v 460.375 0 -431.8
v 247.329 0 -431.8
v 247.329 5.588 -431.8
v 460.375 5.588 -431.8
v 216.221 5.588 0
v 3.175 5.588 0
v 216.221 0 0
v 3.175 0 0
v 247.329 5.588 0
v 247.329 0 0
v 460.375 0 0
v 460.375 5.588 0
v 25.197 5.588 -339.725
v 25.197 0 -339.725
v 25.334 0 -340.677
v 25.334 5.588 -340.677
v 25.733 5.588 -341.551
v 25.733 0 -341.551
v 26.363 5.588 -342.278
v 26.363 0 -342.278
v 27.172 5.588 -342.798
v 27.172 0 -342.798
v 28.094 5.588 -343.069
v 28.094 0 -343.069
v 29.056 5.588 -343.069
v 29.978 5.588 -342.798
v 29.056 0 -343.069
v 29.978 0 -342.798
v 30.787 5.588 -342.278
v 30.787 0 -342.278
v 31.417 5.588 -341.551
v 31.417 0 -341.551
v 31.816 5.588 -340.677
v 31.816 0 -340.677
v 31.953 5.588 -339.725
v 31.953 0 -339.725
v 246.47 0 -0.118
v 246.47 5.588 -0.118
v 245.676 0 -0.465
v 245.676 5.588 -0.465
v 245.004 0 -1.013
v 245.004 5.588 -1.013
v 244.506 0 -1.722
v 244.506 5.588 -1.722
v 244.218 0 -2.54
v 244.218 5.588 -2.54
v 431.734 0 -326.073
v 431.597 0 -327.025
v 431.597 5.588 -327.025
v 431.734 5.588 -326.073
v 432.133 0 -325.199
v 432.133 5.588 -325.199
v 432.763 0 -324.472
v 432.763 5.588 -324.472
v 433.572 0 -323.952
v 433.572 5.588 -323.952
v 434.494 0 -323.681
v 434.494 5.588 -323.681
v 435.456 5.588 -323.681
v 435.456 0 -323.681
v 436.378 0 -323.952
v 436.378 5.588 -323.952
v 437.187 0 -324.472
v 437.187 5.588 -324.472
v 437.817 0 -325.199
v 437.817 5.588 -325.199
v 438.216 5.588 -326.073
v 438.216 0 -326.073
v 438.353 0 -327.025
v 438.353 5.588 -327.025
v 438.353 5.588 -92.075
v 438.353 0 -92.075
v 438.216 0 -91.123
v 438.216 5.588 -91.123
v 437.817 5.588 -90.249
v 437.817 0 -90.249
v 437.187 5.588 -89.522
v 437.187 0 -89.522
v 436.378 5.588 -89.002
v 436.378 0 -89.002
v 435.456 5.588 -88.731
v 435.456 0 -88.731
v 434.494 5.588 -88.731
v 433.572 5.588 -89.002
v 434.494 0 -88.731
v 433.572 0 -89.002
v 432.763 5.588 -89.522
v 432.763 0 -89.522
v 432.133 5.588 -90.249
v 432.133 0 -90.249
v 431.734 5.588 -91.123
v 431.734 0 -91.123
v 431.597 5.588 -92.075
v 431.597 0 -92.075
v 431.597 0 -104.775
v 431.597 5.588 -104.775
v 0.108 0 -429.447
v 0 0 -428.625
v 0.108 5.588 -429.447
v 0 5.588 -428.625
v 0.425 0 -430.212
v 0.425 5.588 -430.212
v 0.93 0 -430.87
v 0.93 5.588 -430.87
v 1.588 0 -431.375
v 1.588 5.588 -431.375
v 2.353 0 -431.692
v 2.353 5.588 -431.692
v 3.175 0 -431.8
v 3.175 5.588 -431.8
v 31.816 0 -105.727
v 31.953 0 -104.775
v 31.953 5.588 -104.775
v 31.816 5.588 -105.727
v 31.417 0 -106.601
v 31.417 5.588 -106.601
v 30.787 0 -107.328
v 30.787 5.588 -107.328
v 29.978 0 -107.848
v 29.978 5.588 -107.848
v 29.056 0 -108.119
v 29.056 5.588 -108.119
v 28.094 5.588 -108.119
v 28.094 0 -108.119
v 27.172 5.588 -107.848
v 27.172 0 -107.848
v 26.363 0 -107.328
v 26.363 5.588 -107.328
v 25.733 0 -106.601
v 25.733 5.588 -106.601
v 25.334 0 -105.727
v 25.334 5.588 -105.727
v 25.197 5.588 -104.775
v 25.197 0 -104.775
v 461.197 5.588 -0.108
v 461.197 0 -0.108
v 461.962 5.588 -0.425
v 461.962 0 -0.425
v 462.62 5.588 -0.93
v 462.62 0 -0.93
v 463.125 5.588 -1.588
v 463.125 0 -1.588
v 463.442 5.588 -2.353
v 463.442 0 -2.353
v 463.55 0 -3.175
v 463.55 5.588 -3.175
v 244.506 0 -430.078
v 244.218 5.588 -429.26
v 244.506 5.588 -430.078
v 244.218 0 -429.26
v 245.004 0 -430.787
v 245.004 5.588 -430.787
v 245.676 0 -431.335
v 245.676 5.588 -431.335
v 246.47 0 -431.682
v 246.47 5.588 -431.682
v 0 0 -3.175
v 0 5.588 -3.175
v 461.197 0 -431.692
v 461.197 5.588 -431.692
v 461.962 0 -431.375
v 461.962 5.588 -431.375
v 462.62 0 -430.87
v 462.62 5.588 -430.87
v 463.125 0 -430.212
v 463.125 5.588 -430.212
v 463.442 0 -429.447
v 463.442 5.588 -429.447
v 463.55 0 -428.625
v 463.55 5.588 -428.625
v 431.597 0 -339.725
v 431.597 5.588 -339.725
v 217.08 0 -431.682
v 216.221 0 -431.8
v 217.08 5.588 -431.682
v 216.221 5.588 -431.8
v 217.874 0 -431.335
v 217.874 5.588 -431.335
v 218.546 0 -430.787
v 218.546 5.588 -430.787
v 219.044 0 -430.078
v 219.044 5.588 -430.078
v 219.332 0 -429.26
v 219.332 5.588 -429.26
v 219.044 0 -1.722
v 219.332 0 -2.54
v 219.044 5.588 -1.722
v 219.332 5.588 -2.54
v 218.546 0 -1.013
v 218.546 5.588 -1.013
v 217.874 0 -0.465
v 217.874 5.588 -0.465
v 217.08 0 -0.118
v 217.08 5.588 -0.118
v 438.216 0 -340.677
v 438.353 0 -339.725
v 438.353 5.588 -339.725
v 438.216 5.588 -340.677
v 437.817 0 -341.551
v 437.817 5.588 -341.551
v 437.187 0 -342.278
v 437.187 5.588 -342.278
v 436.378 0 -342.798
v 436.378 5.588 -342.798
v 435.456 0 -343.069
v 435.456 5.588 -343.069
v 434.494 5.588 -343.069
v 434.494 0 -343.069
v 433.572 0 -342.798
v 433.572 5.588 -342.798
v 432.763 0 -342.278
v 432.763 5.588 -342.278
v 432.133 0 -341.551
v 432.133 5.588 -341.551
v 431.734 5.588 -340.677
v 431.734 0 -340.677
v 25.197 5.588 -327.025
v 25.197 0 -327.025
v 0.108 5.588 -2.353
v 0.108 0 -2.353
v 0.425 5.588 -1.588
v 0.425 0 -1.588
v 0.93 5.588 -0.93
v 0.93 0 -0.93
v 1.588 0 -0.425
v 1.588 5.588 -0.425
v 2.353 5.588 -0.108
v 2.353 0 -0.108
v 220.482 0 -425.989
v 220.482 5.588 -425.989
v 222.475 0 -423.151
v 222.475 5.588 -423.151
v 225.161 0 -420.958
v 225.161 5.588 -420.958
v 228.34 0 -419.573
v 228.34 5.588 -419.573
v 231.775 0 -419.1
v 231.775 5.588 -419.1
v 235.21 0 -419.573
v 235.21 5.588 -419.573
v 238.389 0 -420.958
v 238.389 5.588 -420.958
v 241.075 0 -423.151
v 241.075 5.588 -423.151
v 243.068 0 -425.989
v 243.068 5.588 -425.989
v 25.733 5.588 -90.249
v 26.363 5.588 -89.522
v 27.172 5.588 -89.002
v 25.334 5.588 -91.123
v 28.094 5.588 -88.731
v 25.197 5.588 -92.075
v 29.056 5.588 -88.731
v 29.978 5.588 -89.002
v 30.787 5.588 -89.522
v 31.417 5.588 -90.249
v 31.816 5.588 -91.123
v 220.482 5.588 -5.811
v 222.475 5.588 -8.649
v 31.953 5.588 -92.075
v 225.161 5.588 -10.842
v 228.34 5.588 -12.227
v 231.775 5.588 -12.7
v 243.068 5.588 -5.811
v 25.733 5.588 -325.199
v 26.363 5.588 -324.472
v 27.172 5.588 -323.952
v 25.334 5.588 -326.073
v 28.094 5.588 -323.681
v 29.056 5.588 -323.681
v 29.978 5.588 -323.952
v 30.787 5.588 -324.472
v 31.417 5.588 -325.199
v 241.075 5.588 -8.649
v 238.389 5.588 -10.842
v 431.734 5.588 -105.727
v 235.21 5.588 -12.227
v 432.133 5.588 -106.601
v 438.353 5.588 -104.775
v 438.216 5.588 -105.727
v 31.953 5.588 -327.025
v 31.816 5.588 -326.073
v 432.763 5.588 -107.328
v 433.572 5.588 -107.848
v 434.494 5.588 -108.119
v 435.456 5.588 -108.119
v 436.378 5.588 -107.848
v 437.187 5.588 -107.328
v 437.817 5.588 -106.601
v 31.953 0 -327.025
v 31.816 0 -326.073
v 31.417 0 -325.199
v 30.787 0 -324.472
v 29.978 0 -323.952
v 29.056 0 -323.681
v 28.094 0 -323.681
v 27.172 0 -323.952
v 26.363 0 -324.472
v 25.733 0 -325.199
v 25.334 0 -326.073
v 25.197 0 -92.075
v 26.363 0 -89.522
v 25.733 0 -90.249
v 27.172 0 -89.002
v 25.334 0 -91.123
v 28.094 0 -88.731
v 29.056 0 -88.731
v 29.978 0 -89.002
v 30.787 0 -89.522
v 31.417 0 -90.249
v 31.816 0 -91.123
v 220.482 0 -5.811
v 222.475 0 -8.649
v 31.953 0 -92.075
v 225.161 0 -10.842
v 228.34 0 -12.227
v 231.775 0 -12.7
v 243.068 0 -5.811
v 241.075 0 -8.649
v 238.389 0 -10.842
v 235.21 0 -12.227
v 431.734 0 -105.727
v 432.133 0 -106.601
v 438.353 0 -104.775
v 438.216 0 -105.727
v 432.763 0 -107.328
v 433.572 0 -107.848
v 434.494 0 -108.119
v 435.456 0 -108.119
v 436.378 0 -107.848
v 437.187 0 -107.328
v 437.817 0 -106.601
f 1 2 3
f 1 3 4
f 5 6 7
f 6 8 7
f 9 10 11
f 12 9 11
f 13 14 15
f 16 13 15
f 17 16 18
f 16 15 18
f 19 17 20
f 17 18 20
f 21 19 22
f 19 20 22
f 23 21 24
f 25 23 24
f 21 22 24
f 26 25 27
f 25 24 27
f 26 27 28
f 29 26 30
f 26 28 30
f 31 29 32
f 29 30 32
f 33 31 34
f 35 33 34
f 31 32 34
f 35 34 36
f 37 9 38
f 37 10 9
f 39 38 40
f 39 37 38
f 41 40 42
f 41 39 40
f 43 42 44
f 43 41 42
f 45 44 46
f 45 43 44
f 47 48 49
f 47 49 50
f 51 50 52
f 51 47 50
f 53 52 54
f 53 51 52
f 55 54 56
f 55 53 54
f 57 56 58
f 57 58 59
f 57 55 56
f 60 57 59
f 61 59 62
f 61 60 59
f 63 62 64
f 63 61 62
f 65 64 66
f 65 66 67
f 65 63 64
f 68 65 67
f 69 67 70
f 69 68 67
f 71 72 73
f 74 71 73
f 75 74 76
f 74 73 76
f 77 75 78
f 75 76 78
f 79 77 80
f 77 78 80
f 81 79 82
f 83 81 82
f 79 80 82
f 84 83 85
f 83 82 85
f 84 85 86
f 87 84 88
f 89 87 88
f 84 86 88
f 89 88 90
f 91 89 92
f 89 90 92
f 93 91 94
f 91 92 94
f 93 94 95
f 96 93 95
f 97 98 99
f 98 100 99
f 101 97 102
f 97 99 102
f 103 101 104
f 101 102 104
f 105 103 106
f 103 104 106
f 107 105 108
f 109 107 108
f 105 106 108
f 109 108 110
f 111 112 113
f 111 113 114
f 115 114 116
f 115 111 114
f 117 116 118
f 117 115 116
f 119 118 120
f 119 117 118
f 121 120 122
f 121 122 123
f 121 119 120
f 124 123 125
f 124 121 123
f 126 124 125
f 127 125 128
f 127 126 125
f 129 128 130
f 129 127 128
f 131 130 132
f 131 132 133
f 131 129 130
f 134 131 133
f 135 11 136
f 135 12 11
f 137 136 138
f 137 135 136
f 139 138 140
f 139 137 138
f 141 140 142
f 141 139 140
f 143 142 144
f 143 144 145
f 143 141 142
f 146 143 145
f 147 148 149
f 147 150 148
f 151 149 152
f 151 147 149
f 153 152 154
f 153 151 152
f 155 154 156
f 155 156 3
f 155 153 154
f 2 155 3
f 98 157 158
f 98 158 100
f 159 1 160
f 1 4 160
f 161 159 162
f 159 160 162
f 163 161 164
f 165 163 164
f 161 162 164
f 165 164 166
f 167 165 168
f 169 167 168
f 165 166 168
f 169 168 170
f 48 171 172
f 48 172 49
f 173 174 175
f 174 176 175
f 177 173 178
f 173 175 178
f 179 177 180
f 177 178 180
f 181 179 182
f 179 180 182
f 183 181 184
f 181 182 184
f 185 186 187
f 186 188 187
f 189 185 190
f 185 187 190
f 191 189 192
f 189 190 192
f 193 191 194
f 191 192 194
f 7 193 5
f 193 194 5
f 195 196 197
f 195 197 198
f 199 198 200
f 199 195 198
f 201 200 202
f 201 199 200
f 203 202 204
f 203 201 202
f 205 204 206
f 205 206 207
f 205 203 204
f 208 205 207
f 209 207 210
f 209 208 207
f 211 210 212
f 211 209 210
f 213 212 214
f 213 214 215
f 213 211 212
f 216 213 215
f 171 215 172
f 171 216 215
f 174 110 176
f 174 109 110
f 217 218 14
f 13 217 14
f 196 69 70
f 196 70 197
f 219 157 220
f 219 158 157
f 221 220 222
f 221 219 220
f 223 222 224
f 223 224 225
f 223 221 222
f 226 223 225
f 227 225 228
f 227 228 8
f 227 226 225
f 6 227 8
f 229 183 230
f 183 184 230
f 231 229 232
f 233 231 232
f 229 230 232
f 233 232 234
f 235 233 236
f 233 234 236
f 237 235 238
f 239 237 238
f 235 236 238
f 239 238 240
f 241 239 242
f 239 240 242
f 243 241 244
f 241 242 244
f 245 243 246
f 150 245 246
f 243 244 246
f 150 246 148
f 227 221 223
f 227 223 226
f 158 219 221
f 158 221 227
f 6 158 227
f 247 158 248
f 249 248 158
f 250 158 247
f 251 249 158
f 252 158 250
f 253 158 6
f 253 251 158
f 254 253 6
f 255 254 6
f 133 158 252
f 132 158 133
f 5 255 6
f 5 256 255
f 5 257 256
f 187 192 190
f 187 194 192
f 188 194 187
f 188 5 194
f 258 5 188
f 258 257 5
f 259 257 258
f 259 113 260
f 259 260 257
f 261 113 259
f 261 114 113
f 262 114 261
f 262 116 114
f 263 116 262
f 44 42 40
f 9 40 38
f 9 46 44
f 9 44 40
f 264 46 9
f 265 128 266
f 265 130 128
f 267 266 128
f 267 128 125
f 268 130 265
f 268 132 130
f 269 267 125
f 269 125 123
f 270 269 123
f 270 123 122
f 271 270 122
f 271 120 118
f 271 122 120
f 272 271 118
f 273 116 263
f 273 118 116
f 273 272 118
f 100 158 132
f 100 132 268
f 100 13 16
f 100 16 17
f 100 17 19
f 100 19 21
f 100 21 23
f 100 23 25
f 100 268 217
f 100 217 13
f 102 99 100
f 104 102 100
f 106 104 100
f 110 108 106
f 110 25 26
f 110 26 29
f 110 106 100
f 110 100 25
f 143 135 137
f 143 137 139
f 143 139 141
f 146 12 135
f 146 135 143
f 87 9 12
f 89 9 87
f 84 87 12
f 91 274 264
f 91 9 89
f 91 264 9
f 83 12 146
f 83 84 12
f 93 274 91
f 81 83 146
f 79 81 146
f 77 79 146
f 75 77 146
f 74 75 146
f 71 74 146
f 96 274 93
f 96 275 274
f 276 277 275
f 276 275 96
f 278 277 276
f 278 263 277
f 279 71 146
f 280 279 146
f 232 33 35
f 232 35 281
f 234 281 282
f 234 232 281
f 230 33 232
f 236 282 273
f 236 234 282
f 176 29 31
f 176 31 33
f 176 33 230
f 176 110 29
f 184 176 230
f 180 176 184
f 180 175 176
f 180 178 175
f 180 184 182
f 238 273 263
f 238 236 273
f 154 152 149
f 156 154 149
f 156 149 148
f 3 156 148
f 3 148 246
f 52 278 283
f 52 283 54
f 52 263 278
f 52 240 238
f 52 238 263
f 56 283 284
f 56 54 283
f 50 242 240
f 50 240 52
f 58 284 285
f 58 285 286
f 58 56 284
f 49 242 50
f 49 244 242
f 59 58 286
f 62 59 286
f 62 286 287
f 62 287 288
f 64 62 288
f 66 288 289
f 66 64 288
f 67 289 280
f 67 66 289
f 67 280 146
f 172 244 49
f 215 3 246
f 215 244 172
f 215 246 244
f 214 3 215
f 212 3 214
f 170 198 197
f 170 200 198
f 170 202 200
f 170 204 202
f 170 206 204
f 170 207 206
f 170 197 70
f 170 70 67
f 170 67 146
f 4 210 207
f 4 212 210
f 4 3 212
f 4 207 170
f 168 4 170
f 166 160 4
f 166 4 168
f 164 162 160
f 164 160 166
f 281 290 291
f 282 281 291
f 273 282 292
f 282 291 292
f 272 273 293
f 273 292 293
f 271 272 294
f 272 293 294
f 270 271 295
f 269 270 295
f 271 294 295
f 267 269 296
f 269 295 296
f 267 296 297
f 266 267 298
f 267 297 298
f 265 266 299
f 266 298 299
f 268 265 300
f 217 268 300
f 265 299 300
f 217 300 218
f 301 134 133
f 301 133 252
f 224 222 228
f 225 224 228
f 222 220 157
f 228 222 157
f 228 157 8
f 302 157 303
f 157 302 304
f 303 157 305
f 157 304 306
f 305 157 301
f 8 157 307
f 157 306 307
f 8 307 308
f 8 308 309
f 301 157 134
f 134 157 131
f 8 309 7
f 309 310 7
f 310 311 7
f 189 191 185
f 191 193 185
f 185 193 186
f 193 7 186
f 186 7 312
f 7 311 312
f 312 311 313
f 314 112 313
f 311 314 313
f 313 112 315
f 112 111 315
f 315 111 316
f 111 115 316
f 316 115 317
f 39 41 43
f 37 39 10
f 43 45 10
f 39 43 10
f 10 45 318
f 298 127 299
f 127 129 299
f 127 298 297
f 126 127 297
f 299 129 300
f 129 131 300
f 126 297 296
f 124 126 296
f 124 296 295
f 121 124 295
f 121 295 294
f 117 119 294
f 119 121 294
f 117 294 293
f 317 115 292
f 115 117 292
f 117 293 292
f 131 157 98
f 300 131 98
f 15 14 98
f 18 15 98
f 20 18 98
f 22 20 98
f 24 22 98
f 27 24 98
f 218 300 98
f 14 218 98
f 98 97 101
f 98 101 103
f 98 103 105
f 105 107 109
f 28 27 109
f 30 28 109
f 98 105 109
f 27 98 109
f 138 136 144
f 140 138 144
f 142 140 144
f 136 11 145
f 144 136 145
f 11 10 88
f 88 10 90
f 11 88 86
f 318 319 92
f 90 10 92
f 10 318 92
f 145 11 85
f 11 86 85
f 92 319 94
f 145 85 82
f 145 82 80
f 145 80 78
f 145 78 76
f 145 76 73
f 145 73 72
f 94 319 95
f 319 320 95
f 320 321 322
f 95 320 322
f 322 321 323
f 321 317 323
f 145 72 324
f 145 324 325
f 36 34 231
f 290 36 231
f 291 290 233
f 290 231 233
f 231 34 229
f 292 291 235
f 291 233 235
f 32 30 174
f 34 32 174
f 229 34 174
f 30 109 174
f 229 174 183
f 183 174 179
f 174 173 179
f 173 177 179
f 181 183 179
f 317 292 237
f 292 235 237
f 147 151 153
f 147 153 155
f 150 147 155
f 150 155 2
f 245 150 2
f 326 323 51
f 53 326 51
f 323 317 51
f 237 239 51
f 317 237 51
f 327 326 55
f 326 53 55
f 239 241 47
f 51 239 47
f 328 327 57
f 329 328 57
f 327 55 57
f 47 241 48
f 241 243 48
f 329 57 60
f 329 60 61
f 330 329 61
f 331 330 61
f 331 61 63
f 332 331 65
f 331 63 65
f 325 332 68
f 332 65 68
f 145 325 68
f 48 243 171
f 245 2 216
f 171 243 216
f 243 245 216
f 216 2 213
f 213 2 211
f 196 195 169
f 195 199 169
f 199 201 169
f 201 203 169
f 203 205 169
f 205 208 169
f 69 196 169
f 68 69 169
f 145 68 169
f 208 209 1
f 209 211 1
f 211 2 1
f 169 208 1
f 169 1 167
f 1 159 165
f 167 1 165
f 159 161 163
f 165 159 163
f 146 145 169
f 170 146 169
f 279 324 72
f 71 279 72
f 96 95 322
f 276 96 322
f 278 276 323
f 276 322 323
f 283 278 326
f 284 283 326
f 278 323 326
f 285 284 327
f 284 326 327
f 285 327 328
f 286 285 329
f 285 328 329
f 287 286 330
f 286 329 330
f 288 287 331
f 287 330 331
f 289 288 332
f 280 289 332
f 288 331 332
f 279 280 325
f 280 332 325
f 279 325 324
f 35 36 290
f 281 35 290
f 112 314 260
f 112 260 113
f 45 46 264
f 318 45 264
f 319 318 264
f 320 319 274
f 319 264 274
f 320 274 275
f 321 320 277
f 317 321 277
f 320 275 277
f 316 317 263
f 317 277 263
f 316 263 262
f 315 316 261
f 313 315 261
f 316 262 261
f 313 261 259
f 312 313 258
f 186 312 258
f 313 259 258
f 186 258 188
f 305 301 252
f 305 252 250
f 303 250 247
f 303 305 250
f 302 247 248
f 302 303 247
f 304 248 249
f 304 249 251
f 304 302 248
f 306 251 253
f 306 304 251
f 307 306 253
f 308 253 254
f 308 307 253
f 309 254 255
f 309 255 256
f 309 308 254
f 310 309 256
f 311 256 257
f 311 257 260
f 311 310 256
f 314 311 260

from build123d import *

# Parameters (mm, degrees)
SKETCH1_W           = 463.55
SKETCH1_H           = 431.8
BOSS_EXTRUDE1_DEPTH = 5.588
FILLET1_R           = 3.175
SKETCH2_R           = 12.7
CUT_EXTRUDE1_DEPTH  = 634.530637179
FILLET2_R           = 3.175


with BuildPart() as part:
    # Sketch1 → Boss-Extrude1 (new body)
    with BuildSketch(Plane(origin=(0, 0, 0), x_dir=(1, 0, 0), z_dir=(0, 1, 0))):
        with Locations((231.775, 215.9)):
            Rectangle(SKETCH1_W, SKETCH1_H)
        with BuildLine():
            Line((31.9532, 339.725), (31.9532, 327.025))
            ThreePointArc((31.9532, 327.025), (28.575, 323.6468), (25.1968, 327.025))
            Line((25.1968, 327.025), (25.1968, 339.725))
            ThreePointArc((25.1968, 339.725), (28.575, 343.1032), (31.9532, 339.725))
        make_face(mode=Mode.SUBTRACT)
        with BuildLine():
            Line((31.9532, 92.075), (31.9532, 104.775))
            ThreePointArc((31.9532, 104.775), (28.575, 108.1532), (25.1968, 104.775))
            Line((25.1968, 104.775), (25.1968, 92.075))
            ThreePointArc((25.1968, 92.075), (28.575, 88.6968), (31.9532, 92.075))
        make_face(mode=Mode.SUBTRACT)
        with BuildLine():
            Line((431.5968, 92.075), (431.5968, 104.775))
            ThreePointArc((431.5968, 104.775), (434.975, 108.1532), (438.3532, 104.775))
            Line((438.3532, 104.775), (438.3532, 92.075))
            ThreePointArc((438.3532, 92.075), (434.975, 88.6968), (431.5968, 92.075))
        make_face(mode=Mode.SUBTRACT)
        with BuildLine():
            Line((431.5968, 339.725), (431.5968, 327.025))
            ThreePointArc((431.5968, 327.025), (434.975, 323.6468), (438.3532, 327.025))
            Line((438.3532, 327.025), (438.3532, 339.725))
            ThreePointArc((438.3532, 339.725), (434.975, 343.1032), (431.5968, 339.725))
        make_face(mode=Mode.SUBTRACT)
    extrude(amount=BOSS_EXTRUDE1_DEPTH)

    # Fillet1
    fillet1_edges = [part.edges().sort_by_distance(p)[0] for p in [
        (0, 2.794, -431.8),
        (463.55, 2.794, -431.8),
        (463.55, 2.794, 0),
        (0, 2.794, 0),
    ]]
    fillet(fillet1_edges, radius=FILLET1_R)

    # Sketch2 → Cut-Extrude1 (cut, through all)
    with BuildSketch(Plane(origin=(0, 5.588, 0), x_dir=(1, 0, 0), z_dir=(0, 1, 0))):
        with Locations((231.775, 431.8)):
            Circle(SKETCH2_R)
        with Locations((231.775, 0)):
            Circle(SKETCH2_R)
    extrude(amount=-CUT_EXTRUDE1_DEPTH, mode=Mode.SUBTRACT)

    # Fillet2
    fillet2_edges = [part.edges().sort_by_distance(p)[0] for p in [
        (244.475, 2.794, 0),
        (219.075, 2.794, 0),
        (219.075, 2.794, -431.8),
        (244.475, 2.794, -431.8),
    ]]
    fillet(fillet2_edges, radius=FILLET2_R)


solid = part.part
